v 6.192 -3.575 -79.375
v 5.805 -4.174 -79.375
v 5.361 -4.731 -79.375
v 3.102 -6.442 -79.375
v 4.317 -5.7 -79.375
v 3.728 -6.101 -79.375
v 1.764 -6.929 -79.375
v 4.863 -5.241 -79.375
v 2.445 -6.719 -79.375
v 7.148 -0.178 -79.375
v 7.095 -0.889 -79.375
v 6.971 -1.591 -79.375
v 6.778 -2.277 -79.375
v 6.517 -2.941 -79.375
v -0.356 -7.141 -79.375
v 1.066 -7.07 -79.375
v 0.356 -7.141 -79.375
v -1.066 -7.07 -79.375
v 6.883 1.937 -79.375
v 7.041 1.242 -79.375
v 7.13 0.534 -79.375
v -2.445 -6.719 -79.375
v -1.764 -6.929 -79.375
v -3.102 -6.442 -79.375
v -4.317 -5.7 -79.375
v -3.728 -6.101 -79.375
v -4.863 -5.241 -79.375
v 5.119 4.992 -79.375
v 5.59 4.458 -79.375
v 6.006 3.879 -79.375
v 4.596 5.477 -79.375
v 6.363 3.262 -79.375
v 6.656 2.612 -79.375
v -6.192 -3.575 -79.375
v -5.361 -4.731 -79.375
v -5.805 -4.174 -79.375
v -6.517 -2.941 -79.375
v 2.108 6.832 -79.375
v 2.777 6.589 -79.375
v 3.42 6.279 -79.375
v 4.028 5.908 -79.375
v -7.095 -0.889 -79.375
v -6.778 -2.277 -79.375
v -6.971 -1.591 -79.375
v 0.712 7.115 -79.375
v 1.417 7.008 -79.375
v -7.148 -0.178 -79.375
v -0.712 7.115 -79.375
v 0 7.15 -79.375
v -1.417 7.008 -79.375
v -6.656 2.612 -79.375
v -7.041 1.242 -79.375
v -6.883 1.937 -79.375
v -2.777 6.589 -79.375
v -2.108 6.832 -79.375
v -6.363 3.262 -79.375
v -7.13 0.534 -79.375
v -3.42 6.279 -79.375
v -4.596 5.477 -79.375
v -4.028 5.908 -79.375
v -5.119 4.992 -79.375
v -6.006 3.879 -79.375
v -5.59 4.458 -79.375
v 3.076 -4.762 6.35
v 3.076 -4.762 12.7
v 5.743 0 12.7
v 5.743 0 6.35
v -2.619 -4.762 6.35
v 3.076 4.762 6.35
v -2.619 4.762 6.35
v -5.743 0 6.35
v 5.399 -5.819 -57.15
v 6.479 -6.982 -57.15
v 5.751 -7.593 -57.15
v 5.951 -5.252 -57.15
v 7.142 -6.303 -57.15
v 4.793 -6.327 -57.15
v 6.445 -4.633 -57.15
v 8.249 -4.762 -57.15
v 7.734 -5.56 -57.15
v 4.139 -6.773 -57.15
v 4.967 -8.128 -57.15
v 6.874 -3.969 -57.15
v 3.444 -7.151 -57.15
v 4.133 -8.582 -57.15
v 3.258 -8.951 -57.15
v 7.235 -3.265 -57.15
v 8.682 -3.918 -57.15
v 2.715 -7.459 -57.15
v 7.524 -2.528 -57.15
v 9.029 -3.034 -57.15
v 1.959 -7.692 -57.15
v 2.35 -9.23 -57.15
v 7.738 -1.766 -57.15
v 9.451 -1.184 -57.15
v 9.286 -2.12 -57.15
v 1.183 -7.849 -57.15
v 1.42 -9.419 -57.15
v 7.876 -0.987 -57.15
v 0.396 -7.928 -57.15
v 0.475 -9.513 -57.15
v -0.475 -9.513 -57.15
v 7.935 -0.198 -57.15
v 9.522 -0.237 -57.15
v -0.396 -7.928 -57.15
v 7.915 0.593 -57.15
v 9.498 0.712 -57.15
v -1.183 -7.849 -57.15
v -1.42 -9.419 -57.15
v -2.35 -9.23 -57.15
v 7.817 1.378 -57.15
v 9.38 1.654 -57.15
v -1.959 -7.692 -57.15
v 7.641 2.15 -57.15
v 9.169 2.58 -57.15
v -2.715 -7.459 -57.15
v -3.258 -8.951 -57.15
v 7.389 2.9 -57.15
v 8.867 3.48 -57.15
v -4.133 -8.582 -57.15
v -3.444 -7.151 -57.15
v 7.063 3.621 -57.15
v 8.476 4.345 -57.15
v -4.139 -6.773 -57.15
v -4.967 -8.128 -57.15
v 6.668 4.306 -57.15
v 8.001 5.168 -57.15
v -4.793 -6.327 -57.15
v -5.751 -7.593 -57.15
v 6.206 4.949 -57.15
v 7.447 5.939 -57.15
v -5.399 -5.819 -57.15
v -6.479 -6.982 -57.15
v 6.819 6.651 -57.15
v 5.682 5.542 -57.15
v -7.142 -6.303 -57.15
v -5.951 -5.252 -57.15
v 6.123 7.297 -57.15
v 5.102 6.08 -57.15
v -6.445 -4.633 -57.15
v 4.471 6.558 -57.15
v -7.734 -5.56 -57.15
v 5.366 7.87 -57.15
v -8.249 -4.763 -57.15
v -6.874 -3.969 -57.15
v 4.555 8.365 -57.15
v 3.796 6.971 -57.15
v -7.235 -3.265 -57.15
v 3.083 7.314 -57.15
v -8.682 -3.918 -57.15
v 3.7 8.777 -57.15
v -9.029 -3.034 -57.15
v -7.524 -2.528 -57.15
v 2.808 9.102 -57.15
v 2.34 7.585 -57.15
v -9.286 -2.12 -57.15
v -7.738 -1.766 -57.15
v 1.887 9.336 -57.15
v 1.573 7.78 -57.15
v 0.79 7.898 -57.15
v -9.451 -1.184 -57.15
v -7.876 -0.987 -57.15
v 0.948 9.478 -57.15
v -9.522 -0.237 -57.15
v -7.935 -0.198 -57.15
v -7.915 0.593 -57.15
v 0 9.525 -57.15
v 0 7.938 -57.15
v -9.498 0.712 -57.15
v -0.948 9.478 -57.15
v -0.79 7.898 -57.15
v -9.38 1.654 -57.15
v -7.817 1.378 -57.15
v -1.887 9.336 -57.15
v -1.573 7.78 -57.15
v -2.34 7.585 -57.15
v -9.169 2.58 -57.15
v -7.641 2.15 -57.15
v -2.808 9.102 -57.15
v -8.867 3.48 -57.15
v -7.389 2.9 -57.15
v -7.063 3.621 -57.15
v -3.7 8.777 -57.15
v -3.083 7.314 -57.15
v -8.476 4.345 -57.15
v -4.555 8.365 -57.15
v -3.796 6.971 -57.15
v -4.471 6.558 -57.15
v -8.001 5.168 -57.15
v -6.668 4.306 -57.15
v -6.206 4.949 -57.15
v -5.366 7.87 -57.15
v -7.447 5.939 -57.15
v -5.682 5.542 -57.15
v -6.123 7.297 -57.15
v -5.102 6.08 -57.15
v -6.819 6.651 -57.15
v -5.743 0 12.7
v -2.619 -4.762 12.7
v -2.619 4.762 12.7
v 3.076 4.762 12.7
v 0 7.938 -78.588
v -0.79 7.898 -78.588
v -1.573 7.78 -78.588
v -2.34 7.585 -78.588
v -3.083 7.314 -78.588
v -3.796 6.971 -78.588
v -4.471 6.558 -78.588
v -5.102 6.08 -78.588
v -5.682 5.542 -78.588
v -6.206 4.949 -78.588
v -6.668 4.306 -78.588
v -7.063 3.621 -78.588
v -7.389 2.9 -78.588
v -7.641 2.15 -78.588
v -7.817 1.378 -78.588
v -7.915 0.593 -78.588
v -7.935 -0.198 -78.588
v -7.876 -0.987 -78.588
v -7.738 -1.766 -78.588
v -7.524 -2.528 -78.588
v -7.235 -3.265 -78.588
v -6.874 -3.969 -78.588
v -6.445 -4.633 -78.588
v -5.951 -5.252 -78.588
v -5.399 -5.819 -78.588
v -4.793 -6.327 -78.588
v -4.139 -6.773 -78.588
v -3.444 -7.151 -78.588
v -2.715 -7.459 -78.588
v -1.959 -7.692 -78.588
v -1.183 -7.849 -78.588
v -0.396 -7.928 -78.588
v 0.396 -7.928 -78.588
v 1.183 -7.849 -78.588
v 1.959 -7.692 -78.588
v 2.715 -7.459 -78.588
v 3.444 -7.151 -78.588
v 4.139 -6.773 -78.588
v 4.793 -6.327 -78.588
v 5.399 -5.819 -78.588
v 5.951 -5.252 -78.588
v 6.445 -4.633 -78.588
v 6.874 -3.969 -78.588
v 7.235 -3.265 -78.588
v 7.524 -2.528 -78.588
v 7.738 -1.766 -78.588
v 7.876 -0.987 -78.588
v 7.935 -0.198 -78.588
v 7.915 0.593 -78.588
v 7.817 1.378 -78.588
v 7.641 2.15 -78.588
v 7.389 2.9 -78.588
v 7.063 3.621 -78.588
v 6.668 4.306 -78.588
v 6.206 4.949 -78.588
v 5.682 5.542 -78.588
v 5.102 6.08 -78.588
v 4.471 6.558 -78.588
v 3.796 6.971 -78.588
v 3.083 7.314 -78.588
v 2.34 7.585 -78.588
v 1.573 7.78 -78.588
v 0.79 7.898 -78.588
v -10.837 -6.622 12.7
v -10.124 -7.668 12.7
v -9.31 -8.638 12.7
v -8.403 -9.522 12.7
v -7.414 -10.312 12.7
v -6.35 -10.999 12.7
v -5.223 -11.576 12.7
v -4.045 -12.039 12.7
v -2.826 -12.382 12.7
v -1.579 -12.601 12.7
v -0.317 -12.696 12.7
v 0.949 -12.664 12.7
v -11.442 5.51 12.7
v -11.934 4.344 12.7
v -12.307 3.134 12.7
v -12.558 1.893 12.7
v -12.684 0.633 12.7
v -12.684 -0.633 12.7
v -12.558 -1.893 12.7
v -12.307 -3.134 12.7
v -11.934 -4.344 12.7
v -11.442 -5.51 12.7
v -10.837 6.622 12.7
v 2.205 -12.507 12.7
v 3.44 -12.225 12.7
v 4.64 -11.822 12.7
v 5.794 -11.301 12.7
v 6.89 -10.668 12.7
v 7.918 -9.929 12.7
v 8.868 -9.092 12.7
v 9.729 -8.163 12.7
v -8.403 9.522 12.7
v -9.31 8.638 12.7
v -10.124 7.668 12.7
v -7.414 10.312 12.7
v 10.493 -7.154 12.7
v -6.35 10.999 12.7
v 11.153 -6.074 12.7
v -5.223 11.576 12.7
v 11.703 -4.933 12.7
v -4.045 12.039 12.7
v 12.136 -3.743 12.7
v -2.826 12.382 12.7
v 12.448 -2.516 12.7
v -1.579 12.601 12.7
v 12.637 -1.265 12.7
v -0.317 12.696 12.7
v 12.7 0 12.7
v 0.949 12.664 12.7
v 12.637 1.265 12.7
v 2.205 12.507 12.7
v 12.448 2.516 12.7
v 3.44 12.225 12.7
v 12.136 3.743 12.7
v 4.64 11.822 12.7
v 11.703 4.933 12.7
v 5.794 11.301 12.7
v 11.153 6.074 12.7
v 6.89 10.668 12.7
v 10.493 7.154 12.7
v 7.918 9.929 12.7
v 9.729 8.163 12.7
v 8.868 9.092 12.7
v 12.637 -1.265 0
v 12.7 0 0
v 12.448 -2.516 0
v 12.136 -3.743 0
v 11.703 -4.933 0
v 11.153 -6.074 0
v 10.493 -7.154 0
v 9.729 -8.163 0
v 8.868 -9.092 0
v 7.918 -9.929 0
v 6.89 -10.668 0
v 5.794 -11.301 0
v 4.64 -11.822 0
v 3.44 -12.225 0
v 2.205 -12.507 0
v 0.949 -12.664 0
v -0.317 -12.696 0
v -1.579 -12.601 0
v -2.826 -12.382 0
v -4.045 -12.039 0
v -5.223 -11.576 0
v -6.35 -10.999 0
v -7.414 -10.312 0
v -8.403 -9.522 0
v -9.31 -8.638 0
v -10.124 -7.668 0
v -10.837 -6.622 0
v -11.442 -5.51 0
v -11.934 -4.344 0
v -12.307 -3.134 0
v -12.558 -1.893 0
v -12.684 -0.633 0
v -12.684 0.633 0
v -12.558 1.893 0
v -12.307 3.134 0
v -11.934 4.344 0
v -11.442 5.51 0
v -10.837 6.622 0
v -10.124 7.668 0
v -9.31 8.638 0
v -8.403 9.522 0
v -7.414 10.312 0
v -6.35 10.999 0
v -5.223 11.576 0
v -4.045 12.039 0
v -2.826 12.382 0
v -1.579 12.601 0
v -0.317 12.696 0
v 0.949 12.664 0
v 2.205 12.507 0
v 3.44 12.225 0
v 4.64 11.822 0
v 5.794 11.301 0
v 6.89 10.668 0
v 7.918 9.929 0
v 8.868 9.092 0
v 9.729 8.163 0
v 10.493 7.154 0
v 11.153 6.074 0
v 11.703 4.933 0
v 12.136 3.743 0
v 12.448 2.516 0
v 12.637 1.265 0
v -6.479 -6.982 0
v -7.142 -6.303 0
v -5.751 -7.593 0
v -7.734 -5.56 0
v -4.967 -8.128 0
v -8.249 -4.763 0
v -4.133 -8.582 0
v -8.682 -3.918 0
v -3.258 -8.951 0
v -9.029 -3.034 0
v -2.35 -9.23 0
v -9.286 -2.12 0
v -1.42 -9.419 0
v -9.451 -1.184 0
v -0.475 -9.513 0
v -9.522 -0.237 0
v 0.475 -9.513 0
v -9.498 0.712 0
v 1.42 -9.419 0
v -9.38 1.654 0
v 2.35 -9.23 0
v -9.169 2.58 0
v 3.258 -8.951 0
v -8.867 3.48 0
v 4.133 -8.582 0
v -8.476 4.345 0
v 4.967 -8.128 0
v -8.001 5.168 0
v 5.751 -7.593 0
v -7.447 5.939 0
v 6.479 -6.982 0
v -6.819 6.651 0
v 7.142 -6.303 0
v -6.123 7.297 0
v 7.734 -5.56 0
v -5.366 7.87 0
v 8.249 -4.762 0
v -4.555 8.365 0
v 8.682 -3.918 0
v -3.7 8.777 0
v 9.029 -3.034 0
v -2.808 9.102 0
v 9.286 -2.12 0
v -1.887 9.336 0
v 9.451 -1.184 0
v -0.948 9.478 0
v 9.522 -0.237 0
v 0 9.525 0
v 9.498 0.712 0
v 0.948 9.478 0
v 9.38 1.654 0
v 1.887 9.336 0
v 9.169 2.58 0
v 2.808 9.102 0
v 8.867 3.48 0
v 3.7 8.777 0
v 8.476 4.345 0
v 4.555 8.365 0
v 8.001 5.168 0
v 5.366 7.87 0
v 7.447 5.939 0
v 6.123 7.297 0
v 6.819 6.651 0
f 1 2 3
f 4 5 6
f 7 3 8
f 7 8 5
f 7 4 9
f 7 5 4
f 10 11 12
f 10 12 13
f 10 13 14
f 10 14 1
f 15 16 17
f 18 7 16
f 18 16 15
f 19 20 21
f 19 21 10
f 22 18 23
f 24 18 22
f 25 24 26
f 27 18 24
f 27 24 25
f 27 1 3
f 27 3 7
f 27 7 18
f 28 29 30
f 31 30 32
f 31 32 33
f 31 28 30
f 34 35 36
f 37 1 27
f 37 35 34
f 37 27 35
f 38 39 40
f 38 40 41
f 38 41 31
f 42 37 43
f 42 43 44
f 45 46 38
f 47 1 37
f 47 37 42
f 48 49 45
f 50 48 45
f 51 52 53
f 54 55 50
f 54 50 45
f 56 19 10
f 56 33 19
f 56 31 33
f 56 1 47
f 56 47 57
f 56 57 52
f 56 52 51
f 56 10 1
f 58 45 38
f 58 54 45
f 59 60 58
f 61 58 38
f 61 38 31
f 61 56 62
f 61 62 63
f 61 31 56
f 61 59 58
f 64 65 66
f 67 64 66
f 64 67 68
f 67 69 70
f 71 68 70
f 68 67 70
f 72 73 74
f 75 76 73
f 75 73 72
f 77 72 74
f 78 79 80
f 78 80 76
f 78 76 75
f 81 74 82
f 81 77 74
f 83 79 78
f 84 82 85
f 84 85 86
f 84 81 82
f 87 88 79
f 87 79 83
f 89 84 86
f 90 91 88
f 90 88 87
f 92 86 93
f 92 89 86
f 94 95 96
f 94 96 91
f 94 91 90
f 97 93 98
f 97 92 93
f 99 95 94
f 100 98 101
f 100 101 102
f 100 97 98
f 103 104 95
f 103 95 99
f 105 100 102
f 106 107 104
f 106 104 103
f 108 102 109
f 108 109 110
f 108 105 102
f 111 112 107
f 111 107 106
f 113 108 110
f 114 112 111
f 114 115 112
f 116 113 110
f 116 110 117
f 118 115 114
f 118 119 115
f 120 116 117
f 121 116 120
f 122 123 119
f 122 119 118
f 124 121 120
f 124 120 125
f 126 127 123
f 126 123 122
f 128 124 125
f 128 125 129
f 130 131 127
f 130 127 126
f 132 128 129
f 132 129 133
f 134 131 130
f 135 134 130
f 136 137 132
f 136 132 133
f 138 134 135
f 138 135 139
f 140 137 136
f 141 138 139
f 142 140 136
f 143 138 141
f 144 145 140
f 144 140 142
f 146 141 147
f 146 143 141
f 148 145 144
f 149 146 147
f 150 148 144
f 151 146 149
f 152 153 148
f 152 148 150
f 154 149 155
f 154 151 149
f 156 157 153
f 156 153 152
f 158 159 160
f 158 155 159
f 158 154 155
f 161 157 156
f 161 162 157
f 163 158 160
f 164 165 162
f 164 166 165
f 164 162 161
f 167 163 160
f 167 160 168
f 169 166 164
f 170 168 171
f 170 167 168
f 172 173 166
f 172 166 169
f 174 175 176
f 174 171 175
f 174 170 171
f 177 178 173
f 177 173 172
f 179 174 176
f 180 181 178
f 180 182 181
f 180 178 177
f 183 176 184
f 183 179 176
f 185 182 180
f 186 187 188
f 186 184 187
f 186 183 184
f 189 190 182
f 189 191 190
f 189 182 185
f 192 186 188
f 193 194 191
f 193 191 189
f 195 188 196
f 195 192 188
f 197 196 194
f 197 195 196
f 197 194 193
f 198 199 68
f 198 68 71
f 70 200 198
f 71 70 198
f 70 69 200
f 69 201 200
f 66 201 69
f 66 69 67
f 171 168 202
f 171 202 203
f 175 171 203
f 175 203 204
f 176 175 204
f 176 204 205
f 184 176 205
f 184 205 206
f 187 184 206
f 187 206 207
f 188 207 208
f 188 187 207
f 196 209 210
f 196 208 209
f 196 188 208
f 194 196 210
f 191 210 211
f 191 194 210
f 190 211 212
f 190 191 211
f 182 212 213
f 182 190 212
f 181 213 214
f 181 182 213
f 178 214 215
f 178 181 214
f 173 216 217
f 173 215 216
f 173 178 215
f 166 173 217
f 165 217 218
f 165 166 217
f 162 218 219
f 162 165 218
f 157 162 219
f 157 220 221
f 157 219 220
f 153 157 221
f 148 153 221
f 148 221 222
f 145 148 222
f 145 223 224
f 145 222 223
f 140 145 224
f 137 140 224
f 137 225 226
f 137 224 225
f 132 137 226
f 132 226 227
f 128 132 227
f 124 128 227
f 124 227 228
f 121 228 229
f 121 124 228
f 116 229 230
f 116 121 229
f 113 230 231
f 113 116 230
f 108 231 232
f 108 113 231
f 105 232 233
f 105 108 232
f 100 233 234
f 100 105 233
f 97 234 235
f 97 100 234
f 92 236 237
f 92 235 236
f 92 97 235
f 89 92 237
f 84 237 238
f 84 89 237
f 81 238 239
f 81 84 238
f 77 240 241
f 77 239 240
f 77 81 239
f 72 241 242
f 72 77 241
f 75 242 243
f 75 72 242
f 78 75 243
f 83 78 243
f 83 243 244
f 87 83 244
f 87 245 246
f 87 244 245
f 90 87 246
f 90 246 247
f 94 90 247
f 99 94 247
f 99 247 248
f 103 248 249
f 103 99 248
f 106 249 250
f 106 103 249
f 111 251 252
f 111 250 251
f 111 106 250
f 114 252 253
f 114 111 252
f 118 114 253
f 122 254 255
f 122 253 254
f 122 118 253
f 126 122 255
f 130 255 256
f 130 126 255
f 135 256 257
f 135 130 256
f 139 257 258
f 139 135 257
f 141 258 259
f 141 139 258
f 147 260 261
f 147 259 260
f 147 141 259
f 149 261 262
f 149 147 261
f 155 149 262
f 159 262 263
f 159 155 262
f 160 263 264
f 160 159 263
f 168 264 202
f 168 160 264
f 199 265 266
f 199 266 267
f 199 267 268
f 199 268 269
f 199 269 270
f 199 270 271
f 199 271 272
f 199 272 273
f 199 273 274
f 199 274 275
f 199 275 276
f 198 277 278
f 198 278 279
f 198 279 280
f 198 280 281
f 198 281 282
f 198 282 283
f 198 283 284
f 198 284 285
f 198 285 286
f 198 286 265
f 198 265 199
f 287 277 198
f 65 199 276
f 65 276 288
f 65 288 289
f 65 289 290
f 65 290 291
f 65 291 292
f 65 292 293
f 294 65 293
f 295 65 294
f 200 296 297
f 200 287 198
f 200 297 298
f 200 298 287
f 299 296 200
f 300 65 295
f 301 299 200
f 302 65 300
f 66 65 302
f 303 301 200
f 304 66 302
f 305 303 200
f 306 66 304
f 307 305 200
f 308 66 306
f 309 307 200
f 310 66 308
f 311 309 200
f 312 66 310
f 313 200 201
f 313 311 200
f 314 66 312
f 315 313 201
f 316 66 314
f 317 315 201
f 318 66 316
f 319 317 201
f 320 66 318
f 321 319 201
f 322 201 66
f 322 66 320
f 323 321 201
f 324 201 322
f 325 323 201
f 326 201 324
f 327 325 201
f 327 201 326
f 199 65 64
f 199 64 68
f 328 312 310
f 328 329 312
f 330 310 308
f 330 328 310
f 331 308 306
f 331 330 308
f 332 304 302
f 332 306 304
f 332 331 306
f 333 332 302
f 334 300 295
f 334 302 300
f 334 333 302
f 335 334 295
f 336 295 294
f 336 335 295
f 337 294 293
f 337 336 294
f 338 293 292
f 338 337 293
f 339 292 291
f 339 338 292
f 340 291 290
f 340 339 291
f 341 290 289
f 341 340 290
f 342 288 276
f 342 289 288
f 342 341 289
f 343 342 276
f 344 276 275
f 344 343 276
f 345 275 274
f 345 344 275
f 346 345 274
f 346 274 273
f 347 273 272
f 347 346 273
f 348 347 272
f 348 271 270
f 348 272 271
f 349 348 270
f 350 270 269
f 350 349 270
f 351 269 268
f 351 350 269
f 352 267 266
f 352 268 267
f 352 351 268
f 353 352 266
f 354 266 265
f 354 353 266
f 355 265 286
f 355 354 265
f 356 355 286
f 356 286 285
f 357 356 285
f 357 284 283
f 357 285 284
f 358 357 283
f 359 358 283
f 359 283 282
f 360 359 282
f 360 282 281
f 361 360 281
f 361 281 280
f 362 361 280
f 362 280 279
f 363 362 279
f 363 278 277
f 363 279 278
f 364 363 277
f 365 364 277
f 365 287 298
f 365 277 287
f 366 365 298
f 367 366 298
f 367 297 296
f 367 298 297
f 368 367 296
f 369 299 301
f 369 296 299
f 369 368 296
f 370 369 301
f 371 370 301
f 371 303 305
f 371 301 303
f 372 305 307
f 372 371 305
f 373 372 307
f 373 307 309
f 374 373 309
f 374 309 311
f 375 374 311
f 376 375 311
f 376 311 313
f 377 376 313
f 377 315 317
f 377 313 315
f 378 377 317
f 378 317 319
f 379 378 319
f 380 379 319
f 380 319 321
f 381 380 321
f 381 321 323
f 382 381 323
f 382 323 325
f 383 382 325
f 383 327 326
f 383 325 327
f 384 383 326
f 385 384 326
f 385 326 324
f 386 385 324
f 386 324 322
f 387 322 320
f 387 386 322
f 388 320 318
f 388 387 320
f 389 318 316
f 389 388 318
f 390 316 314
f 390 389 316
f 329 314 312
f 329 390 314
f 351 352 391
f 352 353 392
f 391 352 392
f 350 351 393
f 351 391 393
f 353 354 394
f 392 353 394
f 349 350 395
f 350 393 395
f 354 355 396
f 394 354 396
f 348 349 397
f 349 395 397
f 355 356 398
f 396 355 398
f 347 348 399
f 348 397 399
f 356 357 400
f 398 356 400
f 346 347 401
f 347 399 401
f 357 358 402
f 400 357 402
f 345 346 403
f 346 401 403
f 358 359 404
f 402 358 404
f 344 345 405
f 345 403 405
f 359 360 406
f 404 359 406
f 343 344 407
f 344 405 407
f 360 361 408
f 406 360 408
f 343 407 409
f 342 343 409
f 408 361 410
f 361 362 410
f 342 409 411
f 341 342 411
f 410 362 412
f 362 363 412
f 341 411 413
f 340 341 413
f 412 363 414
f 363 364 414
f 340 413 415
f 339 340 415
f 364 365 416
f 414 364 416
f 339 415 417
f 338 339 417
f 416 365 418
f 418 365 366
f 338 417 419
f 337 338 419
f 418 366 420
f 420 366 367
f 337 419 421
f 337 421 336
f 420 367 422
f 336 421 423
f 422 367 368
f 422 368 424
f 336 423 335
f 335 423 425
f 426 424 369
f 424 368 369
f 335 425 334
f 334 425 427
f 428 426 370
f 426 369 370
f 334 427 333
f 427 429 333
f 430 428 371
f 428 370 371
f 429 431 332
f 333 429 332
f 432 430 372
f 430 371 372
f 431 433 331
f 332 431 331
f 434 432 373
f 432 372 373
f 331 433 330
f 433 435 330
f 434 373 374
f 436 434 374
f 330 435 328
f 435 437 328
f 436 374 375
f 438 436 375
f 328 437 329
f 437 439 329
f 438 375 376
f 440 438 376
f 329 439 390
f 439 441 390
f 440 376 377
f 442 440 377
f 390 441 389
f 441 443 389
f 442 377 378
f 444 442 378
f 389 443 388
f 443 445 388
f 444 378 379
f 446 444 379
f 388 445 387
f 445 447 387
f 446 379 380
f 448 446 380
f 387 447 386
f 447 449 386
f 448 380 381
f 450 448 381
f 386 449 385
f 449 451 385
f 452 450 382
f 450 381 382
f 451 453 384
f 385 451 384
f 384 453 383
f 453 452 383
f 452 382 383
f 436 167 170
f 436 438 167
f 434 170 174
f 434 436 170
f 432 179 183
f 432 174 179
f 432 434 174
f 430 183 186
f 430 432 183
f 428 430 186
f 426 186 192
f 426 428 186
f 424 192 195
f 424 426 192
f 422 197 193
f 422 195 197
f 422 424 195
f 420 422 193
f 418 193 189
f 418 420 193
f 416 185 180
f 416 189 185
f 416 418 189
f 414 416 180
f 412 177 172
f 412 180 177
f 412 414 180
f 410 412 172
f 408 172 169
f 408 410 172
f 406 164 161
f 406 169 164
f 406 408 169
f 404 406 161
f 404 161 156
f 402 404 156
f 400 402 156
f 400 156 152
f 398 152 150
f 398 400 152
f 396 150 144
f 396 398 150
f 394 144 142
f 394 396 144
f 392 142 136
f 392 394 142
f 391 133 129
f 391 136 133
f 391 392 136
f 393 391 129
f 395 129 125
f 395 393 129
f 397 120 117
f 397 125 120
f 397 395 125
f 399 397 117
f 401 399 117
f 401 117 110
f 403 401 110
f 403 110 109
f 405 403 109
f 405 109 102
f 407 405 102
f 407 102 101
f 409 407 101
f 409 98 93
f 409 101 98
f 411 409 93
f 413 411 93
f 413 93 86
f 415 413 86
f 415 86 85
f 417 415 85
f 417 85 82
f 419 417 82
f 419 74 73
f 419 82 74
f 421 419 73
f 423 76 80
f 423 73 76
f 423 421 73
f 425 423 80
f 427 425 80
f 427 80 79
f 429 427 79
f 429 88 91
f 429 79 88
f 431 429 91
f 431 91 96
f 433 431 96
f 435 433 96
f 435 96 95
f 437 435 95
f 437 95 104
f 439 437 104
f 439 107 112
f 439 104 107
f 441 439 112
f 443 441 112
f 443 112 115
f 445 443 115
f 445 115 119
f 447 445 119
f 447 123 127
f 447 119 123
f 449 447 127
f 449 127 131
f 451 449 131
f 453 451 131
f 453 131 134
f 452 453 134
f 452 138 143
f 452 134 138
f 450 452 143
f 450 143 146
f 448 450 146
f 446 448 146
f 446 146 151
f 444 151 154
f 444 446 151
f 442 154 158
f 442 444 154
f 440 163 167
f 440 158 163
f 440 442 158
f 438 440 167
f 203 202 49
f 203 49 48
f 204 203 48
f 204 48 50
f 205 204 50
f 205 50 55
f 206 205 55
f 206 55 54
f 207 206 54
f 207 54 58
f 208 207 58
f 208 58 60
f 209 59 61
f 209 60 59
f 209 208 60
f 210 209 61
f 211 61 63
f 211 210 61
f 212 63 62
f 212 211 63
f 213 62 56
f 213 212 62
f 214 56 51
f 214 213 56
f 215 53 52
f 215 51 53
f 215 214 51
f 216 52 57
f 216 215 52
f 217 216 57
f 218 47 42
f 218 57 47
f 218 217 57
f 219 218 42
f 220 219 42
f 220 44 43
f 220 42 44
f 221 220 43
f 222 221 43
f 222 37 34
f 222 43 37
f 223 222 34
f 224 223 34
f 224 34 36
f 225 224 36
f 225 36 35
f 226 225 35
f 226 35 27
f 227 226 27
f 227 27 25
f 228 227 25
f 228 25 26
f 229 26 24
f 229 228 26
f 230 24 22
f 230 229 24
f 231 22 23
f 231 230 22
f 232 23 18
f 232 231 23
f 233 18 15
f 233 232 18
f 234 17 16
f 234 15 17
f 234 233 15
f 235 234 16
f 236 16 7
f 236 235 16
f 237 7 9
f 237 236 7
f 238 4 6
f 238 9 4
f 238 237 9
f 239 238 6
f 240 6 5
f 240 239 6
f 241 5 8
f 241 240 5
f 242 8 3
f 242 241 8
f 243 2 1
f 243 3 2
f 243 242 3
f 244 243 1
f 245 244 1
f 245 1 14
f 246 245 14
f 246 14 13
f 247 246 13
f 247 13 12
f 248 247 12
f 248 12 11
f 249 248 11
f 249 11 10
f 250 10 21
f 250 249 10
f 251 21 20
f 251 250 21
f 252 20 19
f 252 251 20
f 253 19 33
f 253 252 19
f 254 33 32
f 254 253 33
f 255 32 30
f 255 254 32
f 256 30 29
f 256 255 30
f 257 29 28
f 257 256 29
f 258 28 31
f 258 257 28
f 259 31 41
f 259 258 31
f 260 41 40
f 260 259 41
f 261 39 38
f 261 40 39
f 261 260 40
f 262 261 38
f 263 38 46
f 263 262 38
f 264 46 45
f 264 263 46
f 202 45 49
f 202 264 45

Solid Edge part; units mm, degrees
sketch "Sketch1" plane through (0, 0, 0) normal (0, 0, 1) x (1, 0, 0)
  circle A0 centre (0, 0) radius 12.7
  dimension "D1" = 25.4
extrude "Protrusion1" add sketch "Sketch1" along normal blind 12.7
sketch "Sketch2" plane through (0, 0, 0) normal (0, 0, -1) x (0, 1, 0)
  circle A0 centre (0, 0) radius 9.525
  dimension "D1" = 19.05
extrude "Protrusion2" add sketch "Sketch2" along normal blind 57.15
sketch "Sketch3" plane through (0, 0, -57.15) normal (0, 0, -1) x (0, 1, 0)
  circle A0 centre (0, 0) radius 7.9375
  dimension "D1" = 15.875
extrude "Protrusion3" add sketch "Sketch3" along normal blind 22.225
sketch "Sketch4" plane through (0, 0, 12.7) normal (0, 0, 1) x (0, 1, 0)
  line L0 (-4.7625, 2.6191) -> (0, 5.7431)
  line L1 (-4.7625, -3.0765) -> (-4.7625, 2.6191)
  line L2 (-4.7625, -3.0765) -> (0, -5.7431)
  line L3 (4.7625, -3.0765) -> (0, -5.7431)
  line L4 (4.7625, -3.0765) -> (4.7625, 2.6191)
  line L5 (4.7625, 2.6191) -> (0, 5.7431)
  dimension "D1" = 9.525
extrude "Cutout1" cut sketch "Sketch4" against normal blind 6.35
chamfer "Chamfer1" distance 0.7874 angle 45 1 edges at (0, -7.9375, -79.375)
properties part number "55030052"
